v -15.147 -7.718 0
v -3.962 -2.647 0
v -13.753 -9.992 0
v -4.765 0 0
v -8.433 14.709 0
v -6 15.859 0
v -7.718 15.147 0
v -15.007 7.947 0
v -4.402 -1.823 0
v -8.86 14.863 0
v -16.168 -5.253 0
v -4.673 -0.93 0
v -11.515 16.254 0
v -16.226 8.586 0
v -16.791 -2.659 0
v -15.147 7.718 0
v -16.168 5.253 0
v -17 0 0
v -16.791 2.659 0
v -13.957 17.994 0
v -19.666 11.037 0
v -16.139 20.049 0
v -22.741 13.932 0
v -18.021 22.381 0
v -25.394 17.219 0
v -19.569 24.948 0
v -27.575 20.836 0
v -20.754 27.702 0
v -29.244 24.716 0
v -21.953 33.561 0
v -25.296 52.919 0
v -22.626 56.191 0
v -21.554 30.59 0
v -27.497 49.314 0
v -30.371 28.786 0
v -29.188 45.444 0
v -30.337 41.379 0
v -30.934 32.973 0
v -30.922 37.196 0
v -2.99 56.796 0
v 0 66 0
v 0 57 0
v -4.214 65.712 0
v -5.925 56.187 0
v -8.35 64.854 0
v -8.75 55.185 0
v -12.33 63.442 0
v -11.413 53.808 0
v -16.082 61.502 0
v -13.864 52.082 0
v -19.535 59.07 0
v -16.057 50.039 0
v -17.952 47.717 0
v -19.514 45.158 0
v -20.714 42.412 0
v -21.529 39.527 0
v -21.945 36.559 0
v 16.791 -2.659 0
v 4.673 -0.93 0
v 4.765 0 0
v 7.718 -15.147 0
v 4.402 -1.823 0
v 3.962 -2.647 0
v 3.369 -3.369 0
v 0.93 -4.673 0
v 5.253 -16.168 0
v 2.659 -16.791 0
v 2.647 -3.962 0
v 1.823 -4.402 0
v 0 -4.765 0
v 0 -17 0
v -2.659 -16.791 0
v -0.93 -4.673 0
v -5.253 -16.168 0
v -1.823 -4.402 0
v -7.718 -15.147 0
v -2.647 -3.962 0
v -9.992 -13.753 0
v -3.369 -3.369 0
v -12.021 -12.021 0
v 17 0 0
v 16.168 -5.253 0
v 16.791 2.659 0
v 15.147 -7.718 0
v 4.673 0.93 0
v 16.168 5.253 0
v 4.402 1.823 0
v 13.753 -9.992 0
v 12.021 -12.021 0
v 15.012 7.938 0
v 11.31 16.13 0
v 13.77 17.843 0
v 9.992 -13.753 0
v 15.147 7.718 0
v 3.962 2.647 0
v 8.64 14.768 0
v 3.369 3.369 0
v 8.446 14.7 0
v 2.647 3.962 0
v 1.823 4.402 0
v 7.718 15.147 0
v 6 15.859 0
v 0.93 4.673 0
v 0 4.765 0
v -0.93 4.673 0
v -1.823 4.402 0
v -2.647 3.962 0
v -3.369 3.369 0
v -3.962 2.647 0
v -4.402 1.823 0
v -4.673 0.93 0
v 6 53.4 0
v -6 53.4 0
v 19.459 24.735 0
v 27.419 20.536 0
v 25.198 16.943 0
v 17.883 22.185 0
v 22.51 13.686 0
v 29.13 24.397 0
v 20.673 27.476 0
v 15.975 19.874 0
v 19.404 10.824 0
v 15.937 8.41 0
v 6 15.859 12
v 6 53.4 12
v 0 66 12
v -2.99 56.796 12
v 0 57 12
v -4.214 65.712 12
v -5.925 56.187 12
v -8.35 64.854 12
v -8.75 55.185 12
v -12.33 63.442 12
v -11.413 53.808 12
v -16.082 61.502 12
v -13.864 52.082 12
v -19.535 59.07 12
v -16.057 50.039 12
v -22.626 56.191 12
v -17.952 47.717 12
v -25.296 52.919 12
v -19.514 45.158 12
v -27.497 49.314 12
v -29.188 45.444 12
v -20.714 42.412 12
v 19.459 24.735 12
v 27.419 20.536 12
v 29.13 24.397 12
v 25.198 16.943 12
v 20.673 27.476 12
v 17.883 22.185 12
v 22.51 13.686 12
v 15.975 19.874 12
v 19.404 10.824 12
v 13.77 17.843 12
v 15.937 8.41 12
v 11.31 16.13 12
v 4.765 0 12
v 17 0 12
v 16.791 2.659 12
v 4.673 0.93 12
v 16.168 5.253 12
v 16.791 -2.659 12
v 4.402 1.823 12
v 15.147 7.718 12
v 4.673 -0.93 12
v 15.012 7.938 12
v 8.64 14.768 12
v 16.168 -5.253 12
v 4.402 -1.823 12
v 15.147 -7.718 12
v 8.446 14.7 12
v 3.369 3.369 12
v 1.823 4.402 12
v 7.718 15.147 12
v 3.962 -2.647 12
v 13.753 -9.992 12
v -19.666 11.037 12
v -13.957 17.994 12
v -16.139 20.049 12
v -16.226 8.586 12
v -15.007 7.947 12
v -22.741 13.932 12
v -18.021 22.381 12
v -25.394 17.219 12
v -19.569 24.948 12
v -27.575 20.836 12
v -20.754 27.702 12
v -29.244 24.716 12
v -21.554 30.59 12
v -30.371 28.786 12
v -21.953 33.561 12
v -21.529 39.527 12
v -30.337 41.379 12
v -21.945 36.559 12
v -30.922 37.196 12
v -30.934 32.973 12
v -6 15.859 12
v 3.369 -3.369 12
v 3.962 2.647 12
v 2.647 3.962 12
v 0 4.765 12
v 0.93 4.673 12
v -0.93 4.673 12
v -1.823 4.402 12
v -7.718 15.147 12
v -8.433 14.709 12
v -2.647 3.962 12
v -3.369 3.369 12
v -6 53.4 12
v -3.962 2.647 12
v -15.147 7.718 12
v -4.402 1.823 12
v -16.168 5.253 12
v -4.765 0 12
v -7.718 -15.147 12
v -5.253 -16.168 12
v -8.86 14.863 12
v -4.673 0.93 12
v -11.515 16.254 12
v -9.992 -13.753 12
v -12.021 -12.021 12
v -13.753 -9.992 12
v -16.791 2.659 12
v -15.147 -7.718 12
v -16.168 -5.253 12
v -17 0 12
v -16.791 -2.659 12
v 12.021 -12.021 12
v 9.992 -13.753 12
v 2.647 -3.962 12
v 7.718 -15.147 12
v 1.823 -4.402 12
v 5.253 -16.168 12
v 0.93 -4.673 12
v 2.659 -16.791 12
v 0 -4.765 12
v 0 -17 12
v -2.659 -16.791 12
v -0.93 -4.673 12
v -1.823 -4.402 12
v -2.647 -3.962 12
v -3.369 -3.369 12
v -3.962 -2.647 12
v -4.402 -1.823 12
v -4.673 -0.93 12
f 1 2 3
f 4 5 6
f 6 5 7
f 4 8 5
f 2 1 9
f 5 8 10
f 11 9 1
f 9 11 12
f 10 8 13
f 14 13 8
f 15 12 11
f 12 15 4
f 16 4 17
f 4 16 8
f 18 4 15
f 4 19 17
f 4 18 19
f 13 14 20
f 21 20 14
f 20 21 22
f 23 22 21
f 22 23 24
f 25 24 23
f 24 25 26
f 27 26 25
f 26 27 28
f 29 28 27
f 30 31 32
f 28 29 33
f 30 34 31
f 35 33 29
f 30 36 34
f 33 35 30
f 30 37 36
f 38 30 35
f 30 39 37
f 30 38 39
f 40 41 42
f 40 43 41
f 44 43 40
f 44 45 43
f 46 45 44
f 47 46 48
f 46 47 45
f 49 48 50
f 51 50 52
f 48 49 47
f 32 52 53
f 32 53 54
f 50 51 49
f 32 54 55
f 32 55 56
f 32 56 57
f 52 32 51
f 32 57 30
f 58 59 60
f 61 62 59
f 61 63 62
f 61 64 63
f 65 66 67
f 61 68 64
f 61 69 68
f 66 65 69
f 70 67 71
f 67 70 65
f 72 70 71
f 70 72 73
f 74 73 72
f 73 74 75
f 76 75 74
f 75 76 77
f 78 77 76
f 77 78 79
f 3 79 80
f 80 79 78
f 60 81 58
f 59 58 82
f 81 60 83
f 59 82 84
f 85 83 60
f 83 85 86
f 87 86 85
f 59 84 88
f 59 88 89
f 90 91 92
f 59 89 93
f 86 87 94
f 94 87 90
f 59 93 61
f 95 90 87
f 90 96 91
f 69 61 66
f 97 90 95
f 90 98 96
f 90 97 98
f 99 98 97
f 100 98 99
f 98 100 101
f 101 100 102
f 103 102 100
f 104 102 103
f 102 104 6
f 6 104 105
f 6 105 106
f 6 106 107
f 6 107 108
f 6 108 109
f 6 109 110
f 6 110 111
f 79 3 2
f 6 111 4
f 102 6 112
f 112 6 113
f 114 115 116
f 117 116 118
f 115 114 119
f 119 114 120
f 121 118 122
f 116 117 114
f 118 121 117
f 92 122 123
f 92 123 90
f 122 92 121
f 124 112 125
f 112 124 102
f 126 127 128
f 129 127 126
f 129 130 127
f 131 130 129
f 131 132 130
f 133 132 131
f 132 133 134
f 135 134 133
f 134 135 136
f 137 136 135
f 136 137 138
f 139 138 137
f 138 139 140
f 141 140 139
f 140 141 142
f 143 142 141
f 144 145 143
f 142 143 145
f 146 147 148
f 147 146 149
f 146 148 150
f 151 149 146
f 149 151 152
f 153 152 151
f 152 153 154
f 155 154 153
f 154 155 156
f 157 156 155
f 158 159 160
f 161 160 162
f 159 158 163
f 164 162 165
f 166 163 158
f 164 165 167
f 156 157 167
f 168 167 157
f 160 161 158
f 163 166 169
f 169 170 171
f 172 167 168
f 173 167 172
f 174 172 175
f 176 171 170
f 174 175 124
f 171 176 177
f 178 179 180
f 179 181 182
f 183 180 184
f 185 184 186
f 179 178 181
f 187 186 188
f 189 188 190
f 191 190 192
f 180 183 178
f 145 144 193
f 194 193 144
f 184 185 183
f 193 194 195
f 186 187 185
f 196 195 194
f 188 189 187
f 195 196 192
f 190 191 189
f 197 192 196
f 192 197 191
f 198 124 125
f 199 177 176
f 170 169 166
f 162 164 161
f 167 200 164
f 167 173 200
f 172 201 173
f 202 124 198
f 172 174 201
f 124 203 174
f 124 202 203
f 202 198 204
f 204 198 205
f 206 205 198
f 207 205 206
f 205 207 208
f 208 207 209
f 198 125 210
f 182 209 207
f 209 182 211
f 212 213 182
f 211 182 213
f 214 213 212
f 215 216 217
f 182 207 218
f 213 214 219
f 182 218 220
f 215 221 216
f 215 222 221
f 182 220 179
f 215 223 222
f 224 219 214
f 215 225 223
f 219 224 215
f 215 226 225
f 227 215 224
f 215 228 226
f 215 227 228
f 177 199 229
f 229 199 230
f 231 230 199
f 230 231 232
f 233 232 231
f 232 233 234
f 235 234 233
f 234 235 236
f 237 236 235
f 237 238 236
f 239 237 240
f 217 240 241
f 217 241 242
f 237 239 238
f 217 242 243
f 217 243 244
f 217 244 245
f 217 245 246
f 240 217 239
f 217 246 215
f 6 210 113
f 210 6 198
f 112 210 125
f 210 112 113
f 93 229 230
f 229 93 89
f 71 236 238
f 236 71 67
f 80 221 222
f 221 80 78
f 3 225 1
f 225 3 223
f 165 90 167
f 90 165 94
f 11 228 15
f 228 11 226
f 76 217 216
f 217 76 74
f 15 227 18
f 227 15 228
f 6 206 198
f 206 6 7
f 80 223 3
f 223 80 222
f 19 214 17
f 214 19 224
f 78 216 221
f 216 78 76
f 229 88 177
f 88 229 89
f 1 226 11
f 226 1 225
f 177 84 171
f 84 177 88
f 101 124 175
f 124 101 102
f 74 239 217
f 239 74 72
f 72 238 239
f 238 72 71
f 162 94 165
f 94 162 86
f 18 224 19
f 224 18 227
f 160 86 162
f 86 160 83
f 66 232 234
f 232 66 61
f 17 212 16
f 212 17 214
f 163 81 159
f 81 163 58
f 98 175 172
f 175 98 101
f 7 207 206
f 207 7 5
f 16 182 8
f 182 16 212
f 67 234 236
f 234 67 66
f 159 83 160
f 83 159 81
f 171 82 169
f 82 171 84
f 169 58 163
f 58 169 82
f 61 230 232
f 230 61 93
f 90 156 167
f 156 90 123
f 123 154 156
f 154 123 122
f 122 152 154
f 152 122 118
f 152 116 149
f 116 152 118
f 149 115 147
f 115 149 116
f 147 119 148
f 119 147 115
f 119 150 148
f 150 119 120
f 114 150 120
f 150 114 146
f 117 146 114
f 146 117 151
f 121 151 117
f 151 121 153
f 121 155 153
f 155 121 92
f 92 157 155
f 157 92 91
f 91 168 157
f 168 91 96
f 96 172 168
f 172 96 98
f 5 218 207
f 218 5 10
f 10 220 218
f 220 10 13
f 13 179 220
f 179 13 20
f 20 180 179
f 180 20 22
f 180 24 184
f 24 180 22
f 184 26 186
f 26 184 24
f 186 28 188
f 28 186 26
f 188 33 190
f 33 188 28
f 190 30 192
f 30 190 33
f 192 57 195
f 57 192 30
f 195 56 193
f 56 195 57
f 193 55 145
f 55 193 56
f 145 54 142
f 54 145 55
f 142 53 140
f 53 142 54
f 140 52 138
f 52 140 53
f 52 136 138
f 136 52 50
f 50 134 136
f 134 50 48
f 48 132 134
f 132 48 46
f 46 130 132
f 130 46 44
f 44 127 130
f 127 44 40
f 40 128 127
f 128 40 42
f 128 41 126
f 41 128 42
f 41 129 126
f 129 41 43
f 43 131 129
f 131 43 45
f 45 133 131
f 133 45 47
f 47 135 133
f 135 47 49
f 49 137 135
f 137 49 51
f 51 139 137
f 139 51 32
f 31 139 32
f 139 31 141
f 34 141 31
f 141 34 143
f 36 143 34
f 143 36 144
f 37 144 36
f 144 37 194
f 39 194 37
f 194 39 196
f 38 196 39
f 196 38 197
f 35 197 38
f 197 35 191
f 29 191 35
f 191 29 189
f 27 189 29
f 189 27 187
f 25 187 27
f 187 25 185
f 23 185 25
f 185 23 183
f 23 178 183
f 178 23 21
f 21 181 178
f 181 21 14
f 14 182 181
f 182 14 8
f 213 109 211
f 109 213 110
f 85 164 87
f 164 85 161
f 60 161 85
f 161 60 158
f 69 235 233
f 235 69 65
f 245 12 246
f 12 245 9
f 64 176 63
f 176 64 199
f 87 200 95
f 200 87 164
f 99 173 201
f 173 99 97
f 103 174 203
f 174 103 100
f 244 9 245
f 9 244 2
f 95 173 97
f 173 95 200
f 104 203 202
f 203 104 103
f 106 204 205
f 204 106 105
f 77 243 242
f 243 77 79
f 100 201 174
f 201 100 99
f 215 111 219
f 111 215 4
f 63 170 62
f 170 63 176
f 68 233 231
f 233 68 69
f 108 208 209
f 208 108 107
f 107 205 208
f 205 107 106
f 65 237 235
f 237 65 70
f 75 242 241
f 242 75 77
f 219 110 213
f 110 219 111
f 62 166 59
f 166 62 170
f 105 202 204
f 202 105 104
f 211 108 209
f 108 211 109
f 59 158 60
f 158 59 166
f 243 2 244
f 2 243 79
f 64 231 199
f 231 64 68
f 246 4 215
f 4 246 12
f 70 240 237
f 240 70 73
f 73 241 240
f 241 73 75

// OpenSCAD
$fn = 32;

// ----------------------------------------------------------------------
// Hook: 70 mm shank into a 22 mm curl, 12 mm thick
// ----------------------------------------------------------------------

// --- parameters (mm) ---
shank_len = 70;           // shank length from the boss centre
shank_w = 12;             // shank width
boss_d = 34;              // boss diameter
bore_d = 9.53;            // boss bore
curl_in = 22;             // curl inner radius
curl_out = 31;            // curl outer radius
curl_sweep = 250;         // curl sweep angle
hook_t = 12;              // hook thickness

shank_profile = [[-6, 53.4], [6, 53.4], [6, 15], [-6, 15]];
boss_profile = [[17, 0], [16.791, 2.659], [16.168, 5.253], [15.147, 7.718], [13.753, 9.992], [12.021, 12.021], [9.992, 13.753], [7.718, 15.147], [5.253, 16.168], [2.659, 16.791], [0, 17], [-2.659, 16.791], [-5.253, 16.168], [-7.718, 15.147], [-9.992, 13.753], [-12.021, 12.021], [-13.753, 9.992], [-15.147, 7.718], [-16.168, 5.253], [-16.791, 2.659], [-17, 0], [-16.791, -2.659], [-16.168, -5.253], [-15.147, -7.718], [-13.753, -9.992], [-12.021, -12.021], [-9.992, -13.753], [-7.718, -15.147], [-5.253, -16.168], [-2.659, -16.791], [0, -17], [2.659, -16.791], [5.253, -16.168], [7.718, -15.147], [9.992, -13.753], [12.021, -12.021], [13.753, -9.992], [15.147, -7.718], [16.168, -5.253], [16.791, -2.659]];
curl_profile = [[0, 66], [-4.214, 65.712], [-8.35, 64.854], [-12.33, 63.442], [-16.082, 61.502], [-19.535, 59.07], [-22.626, 56.191], [-25.296, 52.919], [-27.497, 49.314], [-29.188, 45.444], [-30.337, 41.379], [-30.922, 37.196], [-30.934, 32.973], [-30.371, 28.786], [-29.244, 24.716], [-27.575, 20.836], [-25.394, 17.219], [-22.741, 13.932], [-19.666, 11.037], [-16.226, 8.586], [-12.485, 6.625], [-8.512, 5.192], [-4.381, 4.311], [-0.169, 4], [4.046, 4.265], [8.187, 5.101], [12.175, 6.491], [15.937, 8.41], [19.404, 10.824], [22.51, 13.686], [25.198, 16.943], [27.419, 20.536], [29.13, 24.397], [20.673, 27.476], [19.459, 24.735], [17.883, 22.185], [15.975, 19.874], [13.77, 17.843], [11.31, 16.13], [8.64, 14.768], [5.81, 13.781], [2.872, 13.188], [-0.12, 13], [-3.109, 13.221], [-6.041, 13.846], [-8.86, 14.863], [-11.515, 16.254], [-13.957, 17.994], [-16.139, 20.049], [-18.021, 22.381], [-19.569, 24.948], [-20.754, 27.702], [-21.554, 30.59], [-21.953, 33.561], [-21.945, 36.559], [-21.529, 39.527], [-20.714, 42.412], [-19.514, 45.158], [-17.952, 47.717], [-16.057, 50.039], [-13.864, 52.082], [-11.413, 53.808], [-8.75, 55.185], [-5.925, 56.187], [-2.99, 56.796], [0, 57]];

difference() {
  union() {
    /* three overlapping outlines: shank, boss and the smooth curl */
    linear_extrude(height = hook_t) polygon(shank_profile);
    linear_extrude(height = hook_t) polygon(boss_profile);
    linear_extrude(height = hook_t) polygon(curl_profile);
  }
  translate([0, 0, -2.5]) cylinder(h = hook_t + 5, d = bore_d);
}
